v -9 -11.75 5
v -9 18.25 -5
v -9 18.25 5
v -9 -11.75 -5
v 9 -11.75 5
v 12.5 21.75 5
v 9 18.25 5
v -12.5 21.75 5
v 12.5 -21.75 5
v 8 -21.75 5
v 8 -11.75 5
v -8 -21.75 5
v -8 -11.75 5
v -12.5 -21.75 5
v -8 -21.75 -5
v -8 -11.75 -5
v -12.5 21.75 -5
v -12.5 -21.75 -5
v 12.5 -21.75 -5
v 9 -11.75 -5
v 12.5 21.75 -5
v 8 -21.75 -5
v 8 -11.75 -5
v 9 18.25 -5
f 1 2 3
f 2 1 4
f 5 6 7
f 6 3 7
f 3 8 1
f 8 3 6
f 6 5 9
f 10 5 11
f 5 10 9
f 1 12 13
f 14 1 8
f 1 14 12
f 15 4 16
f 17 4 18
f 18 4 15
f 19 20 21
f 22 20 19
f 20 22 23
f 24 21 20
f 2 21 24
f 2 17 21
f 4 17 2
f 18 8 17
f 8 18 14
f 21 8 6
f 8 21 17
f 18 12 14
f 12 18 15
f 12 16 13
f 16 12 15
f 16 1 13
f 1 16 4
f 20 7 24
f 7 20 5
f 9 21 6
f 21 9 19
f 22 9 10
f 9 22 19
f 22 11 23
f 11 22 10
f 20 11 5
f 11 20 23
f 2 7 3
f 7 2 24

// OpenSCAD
//bed clips, to hold liner etc 

fudge = 0.1;
bedClip(jawSpacing=18);//based on wooden walls of the bed of 18mm


module bedClip(jawSpacing=18,jawLength=40,jawThickness=10,wallsThickness=3.5,toothSize=1,toothLength=10){

  armOffset = (jawSpacing+wallsThickness)/2;
  armLen    = jawLength + wallsThickness;
  
  module arm(){
    cube(size=[wallsThickness,armLen,jawThickness],center=true);
    
    //tooth
    translate([wallsThickness/2+toothSize/2,-(armLen-toothLength)/2,0])
    cube(size=[toothSize,toothLength,jawThickness],center=true);
 }

  union(){
    translate([-armOffset,0,0]) arm();
    translate([armOffset,0,0]) mirror([1,0,0]) arm();
    
    translate([0,(armLen-wallsThickness)/2,0]) 
    cube(size=[jawSpacing,wallsThickness,jawThickness],center=true);
  }
}
